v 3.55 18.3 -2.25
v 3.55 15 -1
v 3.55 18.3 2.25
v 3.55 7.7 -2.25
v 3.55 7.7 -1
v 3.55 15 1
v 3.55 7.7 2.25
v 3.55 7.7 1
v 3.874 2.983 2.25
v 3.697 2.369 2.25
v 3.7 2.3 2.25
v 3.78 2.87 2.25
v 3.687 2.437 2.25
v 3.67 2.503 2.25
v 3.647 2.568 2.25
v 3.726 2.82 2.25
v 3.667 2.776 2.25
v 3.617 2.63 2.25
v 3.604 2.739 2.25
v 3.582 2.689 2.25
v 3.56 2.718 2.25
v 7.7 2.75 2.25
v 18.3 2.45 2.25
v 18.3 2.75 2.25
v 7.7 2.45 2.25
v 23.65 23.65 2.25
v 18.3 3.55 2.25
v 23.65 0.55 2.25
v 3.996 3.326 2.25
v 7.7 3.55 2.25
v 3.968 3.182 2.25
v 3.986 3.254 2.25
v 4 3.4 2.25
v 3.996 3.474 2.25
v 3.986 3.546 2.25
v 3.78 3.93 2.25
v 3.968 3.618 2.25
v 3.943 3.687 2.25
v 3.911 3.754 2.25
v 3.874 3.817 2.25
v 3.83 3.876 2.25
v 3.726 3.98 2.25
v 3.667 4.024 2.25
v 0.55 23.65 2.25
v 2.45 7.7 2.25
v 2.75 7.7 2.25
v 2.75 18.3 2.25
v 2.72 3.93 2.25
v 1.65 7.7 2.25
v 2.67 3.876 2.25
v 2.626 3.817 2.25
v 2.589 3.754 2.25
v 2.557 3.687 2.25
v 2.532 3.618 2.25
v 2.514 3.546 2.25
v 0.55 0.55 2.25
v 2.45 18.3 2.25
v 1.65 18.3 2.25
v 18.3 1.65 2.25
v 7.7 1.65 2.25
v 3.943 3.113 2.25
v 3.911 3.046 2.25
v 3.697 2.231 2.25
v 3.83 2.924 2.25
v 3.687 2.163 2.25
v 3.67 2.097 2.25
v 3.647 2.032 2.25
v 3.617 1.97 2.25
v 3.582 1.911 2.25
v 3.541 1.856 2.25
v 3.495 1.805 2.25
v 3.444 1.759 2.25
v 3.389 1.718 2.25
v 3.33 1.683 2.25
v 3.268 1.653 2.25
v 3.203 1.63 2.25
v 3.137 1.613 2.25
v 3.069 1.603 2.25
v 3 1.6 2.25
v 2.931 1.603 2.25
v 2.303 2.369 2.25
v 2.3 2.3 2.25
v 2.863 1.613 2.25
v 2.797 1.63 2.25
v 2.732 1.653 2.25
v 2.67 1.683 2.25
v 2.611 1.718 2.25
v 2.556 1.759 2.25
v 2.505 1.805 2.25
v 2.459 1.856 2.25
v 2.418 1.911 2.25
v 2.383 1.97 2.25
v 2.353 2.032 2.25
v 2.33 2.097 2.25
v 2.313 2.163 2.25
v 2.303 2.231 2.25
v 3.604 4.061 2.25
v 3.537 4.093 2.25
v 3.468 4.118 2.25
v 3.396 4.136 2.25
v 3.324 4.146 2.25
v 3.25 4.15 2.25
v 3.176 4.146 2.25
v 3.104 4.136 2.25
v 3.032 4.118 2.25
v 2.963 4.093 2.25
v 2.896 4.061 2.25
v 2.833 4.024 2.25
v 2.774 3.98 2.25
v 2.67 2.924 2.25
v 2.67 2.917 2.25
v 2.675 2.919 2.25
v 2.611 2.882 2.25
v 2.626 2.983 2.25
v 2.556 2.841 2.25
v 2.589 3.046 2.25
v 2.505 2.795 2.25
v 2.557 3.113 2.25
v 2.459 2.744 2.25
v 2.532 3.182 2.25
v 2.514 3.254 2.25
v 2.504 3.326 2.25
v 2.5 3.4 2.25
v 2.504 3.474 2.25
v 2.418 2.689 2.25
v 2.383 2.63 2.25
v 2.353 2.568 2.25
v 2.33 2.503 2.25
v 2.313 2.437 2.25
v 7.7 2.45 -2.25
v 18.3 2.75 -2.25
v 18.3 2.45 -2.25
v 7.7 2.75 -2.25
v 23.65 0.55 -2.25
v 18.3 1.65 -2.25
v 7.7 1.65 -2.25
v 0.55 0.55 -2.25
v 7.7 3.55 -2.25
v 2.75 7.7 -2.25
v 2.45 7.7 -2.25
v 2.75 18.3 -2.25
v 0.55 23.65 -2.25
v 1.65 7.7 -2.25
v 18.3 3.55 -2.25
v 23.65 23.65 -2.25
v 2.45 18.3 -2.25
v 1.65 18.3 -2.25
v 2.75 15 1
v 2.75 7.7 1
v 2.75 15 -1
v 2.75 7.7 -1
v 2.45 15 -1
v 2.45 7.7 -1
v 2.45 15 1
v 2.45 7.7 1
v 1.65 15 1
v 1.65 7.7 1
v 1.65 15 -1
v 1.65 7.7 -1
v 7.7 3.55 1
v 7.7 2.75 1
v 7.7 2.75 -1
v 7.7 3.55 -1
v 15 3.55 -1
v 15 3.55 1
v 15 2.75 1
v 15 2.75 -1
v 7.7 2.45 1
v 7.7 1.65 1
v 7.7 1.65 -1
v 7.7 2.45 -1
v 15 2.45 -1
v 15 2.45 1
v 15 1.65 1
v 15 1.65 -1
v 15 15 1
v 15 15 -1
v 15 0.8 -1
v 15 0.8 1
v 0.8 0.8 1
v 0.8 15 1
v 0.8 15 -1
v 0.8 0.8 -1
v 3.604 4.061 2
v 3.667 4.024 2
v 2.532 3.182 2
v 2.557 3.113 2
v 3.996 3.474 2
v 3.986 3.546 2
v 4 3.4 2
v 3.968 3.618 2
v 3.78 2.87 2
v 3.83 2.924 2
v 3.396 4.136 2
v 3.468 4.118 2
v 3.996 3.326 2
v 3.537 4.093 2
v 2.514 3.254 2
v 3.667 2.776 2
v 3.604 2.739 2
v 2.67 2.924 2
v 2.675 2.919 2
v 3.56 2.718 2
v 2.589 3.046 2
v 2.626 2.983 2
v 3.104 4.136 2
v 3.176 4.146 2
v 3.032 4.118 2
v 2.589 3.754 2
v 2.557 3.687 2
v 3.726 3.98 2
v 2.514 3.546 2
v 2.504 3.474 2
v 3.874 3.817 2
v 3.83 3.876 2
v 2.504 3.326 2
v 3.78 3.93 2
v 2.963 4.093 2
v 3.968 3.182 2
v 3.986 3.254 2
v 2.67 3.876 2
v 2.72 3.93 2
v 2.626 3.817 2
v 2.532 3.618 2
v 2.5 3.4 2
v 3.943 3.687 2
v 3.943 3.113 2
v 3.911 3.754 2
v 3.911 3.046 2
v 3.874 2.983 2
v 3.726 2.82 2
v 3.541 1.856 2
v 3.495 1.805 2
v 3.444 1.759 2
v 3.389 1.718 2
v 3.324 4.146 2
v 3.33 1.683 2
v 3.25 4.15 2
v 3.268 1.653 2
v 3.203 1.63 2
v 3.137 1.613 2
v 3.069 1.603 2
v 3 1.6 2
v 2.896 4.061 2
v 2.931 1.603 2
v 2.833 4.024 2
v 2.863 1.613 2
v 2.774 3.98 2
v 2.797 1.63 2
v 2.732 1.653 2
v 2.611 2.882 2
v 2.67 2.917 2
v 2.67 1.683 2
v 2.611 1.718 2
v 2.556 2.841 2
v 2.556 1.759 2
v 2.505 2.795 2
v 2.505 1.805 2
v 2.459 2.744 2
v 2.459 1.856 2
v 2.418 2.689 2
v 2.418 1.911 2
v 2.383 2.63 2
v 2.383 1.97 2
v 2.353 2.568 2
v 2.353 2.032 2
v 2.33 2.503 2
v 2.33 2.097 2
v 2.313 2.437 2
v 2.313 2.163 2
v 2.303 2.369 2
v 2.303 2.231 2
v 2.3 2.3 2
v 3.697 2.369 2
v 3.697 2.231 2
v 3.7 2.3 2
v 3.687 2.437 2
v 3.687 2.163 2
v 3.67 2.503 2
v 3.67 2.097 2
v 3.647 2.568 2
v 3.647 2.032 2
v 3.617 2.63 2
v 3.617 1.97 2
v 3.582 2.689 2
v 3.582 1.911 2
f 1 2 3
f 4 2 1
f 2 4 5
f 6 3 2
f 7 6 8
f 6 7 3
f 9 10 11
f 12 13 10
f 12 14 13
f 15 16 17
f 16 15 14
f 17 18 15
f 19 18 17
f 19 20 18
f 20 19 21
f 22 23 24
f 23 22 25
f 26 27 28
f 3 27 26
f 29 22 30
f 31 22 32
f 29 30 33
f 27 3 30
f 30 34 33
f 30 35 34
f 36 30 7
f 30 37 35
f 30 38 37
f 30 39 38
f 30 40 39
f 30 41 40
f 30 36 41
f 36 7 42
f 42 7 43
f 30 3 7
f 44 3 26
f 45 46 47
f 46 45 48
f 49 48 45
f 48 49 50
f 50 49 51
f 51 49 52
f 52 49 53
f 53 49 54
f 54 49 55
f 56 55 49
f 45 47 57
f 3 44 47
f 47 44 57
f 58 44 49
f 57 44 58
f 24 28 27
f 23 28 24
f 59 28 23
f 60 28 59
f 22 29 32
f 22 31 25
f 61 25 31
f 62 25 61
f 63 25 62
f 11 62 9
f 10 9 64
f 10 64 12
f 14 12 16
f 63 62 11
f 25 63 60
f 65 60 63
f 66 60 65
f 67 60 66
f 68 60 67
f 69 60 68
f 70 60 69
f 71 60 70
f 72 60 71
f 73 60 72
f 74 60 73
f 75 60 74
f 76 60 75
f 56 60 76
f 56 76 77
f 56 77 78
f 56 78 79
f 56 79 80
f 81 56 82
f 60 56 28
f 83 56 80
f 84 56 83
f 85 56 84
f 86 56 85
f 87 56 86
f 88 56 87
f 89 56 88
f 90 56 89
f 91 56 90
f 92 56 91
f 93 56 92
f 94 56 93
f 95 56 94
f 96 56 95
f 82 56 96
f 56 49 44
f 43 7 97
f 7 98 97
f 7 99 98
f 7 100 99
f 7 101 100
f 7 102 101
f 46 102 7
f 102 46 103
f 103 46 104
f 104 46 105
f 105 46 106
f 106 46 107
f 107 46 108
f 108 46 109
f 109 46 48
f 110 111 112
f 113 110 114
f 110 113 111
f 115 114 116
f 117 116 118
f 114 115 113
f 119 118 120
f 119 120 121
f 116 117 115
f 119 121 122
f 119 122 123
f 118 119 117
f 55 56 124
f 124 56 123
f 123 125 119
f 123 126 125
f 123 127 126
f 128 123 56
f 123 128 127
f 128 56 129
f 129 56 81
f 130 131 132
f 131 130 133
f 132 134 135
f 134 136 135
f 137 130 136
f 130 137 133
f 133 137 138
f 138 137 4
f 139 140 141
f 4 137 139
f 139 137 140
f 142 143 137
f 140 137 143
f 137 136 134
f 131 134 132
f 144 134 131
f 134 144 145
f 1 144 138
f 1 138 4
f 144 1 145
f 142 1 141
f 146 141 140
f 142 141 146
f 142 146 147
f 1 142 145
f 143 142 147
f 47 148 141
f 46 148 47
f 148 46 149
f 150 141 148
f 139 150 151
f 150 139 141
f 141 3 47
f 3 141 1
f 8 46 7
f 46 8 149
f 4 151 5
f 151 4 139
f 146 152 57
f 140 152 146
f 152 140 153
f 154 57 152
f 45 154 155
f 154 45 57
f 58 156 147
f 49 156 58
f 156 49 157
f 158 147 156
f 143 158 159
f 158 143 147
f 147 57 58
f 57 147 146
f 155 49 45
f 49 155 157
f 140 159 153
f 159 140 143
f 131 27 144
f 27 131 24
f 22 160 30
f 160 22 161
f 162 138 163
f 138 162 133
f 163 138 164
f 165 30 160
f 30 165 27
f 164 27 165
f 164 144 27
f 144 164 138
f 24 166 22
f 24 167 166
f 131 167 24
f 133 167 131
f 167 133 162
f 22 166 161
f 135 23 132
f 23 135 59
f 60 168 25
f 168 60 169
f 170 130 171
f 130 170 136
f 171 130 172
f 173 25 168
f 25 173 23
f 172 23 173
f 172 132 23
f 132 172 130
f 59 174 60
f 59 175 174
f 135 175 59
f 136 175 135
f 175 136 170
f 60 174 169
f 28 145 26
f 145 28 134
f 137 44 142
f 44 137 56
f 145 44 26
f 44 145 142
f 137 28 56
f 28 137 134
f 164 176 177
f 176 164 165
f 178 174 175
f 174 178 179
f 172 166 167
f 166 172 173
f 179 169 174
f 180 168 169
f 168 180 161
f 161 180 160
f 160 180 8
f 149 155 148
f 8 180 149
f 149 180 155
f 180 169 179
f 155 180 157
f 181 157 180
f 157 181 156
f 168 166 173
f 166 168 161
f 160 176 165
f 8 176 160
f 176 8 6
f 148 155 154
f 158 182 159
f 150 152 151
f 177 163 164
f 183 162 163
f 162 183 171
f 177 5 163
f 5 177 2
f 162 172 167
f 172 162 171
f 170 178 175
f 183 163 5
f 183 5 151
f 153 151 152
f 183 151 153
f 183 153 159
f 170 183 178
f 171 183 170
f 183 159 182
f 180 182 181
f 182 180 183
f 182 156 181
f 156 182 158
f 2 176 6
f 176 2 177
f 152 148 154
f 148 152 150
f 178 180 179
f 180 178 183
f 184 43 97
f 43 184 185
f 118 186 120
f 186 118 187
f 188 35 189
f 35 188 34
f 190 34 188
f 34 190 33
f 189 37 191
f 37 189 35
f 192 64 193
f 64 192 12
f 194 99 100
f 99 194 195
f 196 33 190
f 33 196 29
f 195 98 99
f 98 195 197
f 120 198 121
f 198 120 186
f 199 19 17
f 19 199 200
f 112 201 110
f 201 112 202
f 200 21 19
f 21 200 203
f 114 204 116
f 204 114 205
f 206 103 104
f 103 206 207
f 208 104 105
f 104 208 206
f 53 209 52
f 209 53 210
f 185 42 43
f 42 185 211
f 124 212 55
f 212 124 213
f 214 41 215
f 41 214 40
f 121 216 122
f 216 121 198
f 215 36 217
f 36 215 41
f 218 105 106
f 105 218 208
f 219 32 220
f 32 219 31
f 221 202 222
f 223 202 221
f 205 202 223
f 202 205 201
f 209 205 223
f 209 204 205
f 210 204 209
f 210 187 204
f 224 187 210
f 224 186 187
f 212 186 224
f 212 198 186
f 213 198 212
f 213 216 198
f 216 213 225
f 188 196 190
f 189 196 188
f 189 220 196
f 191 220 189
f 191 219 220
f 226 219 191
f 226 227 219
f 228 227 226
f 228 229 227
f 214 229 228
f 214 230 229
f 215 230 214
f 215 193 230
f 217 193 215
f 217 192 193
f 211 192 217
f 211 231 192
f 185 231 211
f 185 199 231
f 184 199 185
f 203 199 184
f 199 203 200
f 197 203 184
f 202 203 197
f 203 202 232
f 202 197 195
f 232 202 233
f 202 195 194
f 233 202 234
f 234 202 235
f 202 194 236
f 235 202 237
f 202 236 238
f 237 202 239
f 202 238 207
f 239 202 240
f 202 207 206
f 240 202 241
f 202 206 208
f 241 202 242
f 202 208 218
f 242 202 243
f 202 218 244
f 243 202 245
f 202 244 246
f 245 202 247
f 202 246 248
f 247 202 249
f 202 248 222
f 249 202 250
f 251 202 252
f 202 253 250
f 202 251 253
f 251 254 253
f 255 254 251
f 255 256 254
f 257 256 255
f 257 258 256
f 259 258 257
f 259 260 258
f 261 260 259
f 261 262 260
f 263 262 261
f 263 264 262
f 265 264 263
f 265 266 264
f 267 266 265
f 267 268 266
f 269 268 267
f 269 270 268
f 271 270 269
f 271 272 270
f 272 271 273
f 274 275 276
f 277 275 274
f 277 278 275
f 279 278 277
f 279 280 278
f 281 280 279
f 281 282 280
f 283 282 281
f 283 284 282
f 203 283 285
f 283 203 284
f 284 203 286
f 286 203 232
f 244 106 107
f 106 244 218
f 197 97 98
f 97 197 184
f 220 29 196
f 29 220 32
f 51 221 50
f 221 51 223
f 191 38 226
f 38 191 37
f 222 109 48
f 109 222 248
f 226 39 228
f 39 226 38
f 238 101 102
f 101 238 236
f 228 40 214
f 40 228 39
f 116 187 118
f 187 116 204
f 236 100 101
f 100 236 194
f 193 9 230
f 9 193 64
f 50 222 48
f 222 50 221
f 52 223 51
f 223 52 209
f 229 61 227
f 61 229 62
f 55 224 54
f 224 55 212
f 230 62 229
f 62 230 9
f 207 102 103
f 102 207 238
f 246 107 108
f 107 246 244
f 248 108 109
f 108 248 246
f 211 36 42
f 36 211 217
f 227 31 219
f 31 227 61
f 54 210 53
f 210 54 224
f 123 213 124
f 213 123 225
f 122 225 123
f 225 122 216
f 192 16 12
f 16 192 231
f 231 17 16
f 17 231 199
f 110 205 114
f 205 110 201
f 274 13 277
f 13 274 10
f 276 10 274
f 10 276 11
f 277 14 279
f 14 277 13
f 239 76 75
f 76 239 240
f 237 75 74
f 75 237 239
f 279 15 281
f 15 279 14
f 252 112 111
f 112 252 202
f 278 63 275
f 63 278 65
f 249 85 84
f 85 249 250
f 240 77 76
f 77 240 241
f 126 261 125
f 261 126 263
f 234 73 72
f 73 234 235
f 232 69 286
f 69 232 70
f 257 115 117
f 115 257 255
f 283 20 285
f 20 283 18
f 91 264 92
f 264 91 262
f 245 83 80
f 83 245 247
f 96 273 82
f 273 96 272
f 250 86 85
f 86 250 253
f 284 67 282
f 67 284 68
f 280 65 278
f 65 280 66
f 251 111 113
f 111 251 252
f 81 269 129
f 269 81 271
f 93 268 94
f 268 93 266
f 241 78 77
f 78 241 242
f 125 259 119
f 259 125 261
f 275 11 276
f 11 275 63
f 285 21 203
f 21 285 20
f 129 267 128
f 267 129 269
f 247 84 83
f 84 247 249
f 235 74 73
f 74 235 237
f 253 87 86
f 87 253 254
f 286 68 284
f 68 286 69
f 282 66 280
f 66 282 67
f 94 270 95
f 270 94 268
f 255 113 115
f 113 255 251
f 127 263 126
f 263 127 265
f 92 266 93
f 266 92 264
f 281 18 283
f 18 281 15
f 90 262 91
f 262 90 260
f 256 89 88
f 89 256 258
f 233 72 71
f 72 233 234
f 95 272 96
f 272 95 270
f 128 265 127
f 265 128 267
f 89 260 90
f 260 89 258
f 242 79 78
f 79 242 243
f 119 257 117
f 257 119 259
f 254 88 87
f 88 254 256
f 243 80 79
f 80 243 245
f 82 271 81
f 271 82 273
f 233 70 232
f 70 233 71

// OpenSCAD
// ============================================================================
// PG1350 to PG1425 Switch Adapter - Main Shell Design (FIXED)
// OpenSCAD model for 3D printing
// 
// DESIGN: Plate-mounted bezel with dual-ended stamped contacts (Option B)
// See CONSOLIDATED_SWITCH_SPECS.md and project_overview.md for design details
//
// AUTHOR: Fixed geometry to properly connect all parts
// ============================================================================

// ============================================================================
// TOP-LEVEL CONFIGURABLE PARAMETERS
// ============================================================================

// Material & Print Settings
$fn = 64;                           // Smoothness of curves (higher = smoother, slower render)
wall_thickness = 1.2;               // mm - Wall thickness for printed shell
base_thickness = 2.0;               // mm - Base plate thickness
top_cover_thickness = 2.5;          // mm - Top cover thickness
filament_width = 0.6;               // mm - Typical FDM filament width

// Assembly & Tolerance Settings
print_tolerance = 0.1;              // mm - Add to internal dimensions for printing
assembly_clearance = 0.2;           // mm - Clearance for moving parts/assembly
contact_material_thickness = 0.5;   // mm - Thickness of stamped contact material
mounting_clearance = 0.3;           // mm - Extra clearance for mounting holes

// ============================================================================
// PG1350 SWITCH DIMENSIONS (from Kaihua Electronics CP6135001D02-1)
// ============================================================================

// External dimensions (top shell)
choc_external_width = 15.0;         // mm - Top shell width/height
choc_external_height = 15.0;        // mm - Bottom shell width/height

// Internal opening (where switch stem enters)
choc_internal_opening = 13.8;       // mm - Critical dimension for PG1350 compatibility

// Stem diameter (critical for mechanical stability)
choc_stem_diameter = 3.2;           // mm - Must match PG1350 stem exactly

// Mounting heights
choc_top_mount_height = 5.0;        // mm - Top mounting height from PCB
choc_bottom_mount_height = 5.8;     // mm - Bottom mounting height from PCB

// PCB interface (PG1350 side)
choc_pcb_width = 5.90;              // mm - Overall PCB width
choc_pcb_length = 11.00;            // mm - Overall PCB length  
choc_pin_spacing_x = 3.80;          // mm - Pin center-to-center (X)
choc_pin_spacing_y = 5.00;          // mm - Pin center-to-center (Y)

// PCB mounting holes
choc_top_hole_diameter = 1.90;      // mm - Top mounting holes (2 holes)
choc_bottom_hole_diameter = 1.20;   // mm - Bottom mounting holes (2 holes)

// Side profile features
choc_side_height = 14.50;           // mm - Total side height
choc_top_flange_width = 2.65;       // mm - Top flange width
choc_bottom_flange_width = 3.00;    // mm - Bottom flange width

// ============================================================================
// PG1425 SWITCH DIMENSIONS (from Kaihua Electronics CP6142501D02)
// ============================================================================

// External dimensions
pg1425_external_width = 14.0;       // mm - Top shell width/height
pg1425_external_height = 14.0;      // mm - Bottom shell width/height

// Internal opening (where switch stem enters)
pg1425_internal_opening = 10.2;     // mm - Critical dimension for PG1425 compatibility

// Stem diameter (critical for mechanical stability)
pg1425_stem_diameter = 0.9;         // mm - Must match PG1425 stem exactly

// Mounting heights
pg1425_top_mount_height = 5.0;      // mm - Top mounting height from PCB
pg1425_bottom_mount_height = 5.0;   // mm - Bottom mounting height from PCB

// PCB interface (PG1425 side)
pg1425_pcb_width = 5.50;            // mm - Overall PCB width
pg1425_pcb_length = 5.50;           // mm - Overall PCB length
pg1425_pin_spacing = 2.90;          // mm - Pin center-to-center

// PCB mounting holes
pg1425_top_hole_diameter = 1.30;    // mm - Top mounting holes (2 holes)
pg1425_bottom_hole_diameter = 1.10; // mm - Bottom mounting holes (2 holes)

// Land pattern (copper clad side)
pg1425_top_land_width = 5.10;       // mm - Top land width
pg1425_bottom_land_width = 5.50;    // mm - Bottom land width

// LED position (full color variant)
pg1425_led_x_offset = 4.10;         // mm from left pin center
pg1425_led_y_offset = 1.15;         // mm from bottom pin center

// ============================================================================
// ADAPTER GEOMETRY CALCULATIONS
// ============================================================================

// Size difference between PG1350 and PG1425 external dimensions
size_diff_width = choc_external_width - pg1425_external_width;  // 1.0mm
size_diff_height = choc_external_height - pg1425_external_height; // 1.0mm

// Gap to bridge (PG1350 internal opening minus PG1425 PCB footprint)
gap_to_bridge_x = choc_internal_opening - pg1425_pcb_width;    // 8.3mm total
gap_to_bridge_y = choc_internal_opening - pg1425_pcb_length;   // 8.3mm total

// Per-side gap for bridge design (centered)
bridge_half_x = gap_to_bridge_x / 2;     // ~4.15mm per side
bridge_half_y = gap_to_bridge_y / 2;     // ~4.15mm per side

// PCB interface gap
pcb_gap_width = choc_pcb_width - pg1425_pcb_width;    // 0.40mm total (0.20mm per side)

// ============================================================================
// HELPER FUNCTIONS
// ============================================================================

// Module to create a cylindrical hole with optional counterbore
module mounting_hole(x, y, diameter, depth, counterbore_diameter = null, 
                      counterbore_depth = null) {
    // Main through-hole
    cylinder(h = depth + 0.2, r = diameter/2, center = [x, y], $fn = 32);
    
    // Optional counterbore
    if (counterbore_diameter != null) {
        translate([x, y, -counterbore_depth]) 
            cylinder(h = depth + counterbore_depth + 0.2, r = counterbore_diameter/2, center = [x, y], $fn = 32);
    }
}

// Module to create a cylindrical protrusion/post
module post(x, y, diameter, height) {
    cylinder(h = height, r = diameter/2, center = [x, y], $fn = 32);
}

// ============================================================================
// MAIN RENDER BLOCK - Constructive Solid Geometry Approach (FIXED)
// ============================================================================

difference() {
    // Start with a solid outer bounding box (the complete adapter shell)
    translate([wall_thickness/2 - print_tolerance/2, wall_thickness/2 - print_tolerance/2, 
                -(base_thickness + top_cover_thickness)/2])
        cube([choc_external_width + pg1425_pcb_width + 2*wall_thickness - (print_tolerance-assembly_clearance)*2, 
               choc_external_height + pg1425_pcb_length + 2*wall_thickness - (print_tolerance-assembly_clearance)*2, 
               base_thickness + top_cover_thickness], center = [0, 0, 0]);
    
    // Carve out PG1350 side cavity with proper wall thickness
    translate([wall_thickness/2 + assembly_clearance, wall_thickness/2 + assembly_clearance, -base_thickness/2])
        cube([choc_internal_opening + assembly_clearance*2, 
               choc_internal_opening + assembly_clearance*2, base_thickness], center = [choc_external_width/2, choc_external_height/2, 0]);
    
    // Carve out PG1425 side cavity with proper wall thickness - FIXED POSITIONING
    translate([wall_thickness/2 + assembly_clearance, wall_thickness/2 + assembly_clearance, -base_thickness/2])
        cube([pg1425_internal_opening + assembly_clearance*2, 
               pg1425_internal_opening + assembly_clearance*2, base_thickness], center = [choc_external_width/2 + bridge_half_x, choc_external_height/2 + bridge_half_y, 0]);
    
    // Carve out PG1350 PCB mounting holes (top) - subtract from solid
    translate([-choc_pcb_width/2 - choc_top_hole_diameter/2 - mounting_clearance + wall_thickness/2, 
                -choc_pin_spacing_y/2 - choc_top_hole_diameter/2 - mounting_clearance + wall_thickness/2, base_thickness])
        cylinder(h = base_thickness + 0.2, r = (choc_top_hole_diameter + mounting_clearance)/2);
    
    translate([choc_pcb_width/2 + choc_top_hole_diameter/2 + mounting_clearance - wall_thickness/2, 
                -choc_pin_spacing_y/2 - choc_top_hole_diameter/2 - mounting_clearance + wall_thickness/2, base_thickness])
        cylinder(h = base_thickness + 0.2, r = (choc_top_hole_diameter + mounting_clearance)/2);
    
    // Carve out PG1350 PCB mounting holes (bottom)  
    translate([-choc_pcb_width/2 - choc_bottom_hole_diameter/2 - mounting_clearance + wall_thickness/2, 
                choc_pin_spacing_y/2 + choc_bottom_hole_diameter/2 - mounting_clearance + wall_thickness/2, base_thickness])
        cylinder(h = base_thickness + 0.2, r = (choc_bottom_hole_diameter + mounting_clearance)/2);
    
    translate([choc_pcb_width/2 + choc_bottom_hole_diameter/2 + mounting_clearance - wall_thickness/2, 
                choc_pin_spacing_y/2 + choc_bottom_hole_diameter/2 - mounting_clearance + wall_thickness/2, base_thickness])
        cylinder(h = base_thickness + 0.2, r = (choc_bottom_hole_diameter + mounting_clearance)/2);
    
    // Carve out PG1425 PCB mounting holes (top)
    translate([-pg1425_pcb_width/2 - pg1425_top_hole_diameter/2 - mounting_clearance + wall_thickness/2, 
                -pg1425_pin_spacing/2 - pg1425_top_hole_diameter/2 - mounting_clearance + wall_thickness/2, base_thickness])
        cylinder(h = base_thickness + 0.2, r = (pg1425_top_hole_diameter + mounting_clearance)/2);
    
    translate([pg1425_pcb_width/2 + pg1425_top_hole_diameter/2 + mounting_clearance - wall_thickness/2, 
                -pg1425_pin_spacing/2 - pg1425_top_hole_diameter/2 - mounting_clearance + wall_thickness/2, base_thickness])
        cylinder(h = base_thickness + 0.2, r = (pg1425_top_hole_diameter + mounting_clearance)/2);
    
    // Carve out PG1425 PCB mounting holes (bottom)  
    translate([-pg1425_pcb_width/2 - pg1425_bottom_hole_diameter/2 - mounting_clearance + wall_thickness/2, 
                pg1425_pin_spacing/2 + pg1425_bottom_hole_diameter/2 - mounting_clearance + wall_thickness/2, base_thickness])
        cylinder(h = base_thickness + 0.2, r = (pg1425_bottom_hole_diameter + mounting_clearance)/2);
    
    translate([pg1425_pcb_width/2 + pg1425_bottom_hole_diameter/2 + mounting_clearance - wall_thickness/2, 
                pg1425_pin_spacing/2 + pg1425_bottom_hole_diameter/2 - mounting_clearance + wall_thickness/2, base_thickness])
        cylinder(h = base_thickness + 0.2, r = (pg1425_bottom_hole_diameter + mounting_clearance)/2);
    
    // ADD BRIDGE WALLS BETWEEN PG1350 AND PG1425 SIDES - THIS CONNECTS THE GEOMETRY
    union() {
        // Left bridge wall (connecting the two cavities)
        translate([choc_external_width/2 - bridge_half_x - wall_thickness/2, 
                    choc_external_height/2 + assembly_clearance, 
                    -(base_thickness + top_cover_thickness)/2])
            cube([wall_thickness - assembly_clearance*2, 
                   pg1425_internal_opening + assembly_clearance*2, 
                   base_thickness + top_cover_thickness], center = [0, 0, 0]);
        
        // Right bridge wall (connecting the two cavities)
        translate([choc_external_width/2 + bridge_half_x + wall_thickness/2 - pg1425_internal_opening - assembly_clearance*2, 
                    choc_external_height/2 + assembly_clearance, 
                    -(base_thickness + top_cover_thickness)/2])
            cube([wall_thickness - assembly_clearance*2, 
                   pg1425_internal_opening + assembly_clearance*2, 
                   base_thickness + top_cover_thickness], center = [0, 0, 0]);
        
        // Front bridge wall (connecting the two cavities)
        translate([choc_external_width/2 + assembly_clearance, 
                    choc_external_height/2 - bridge_half_y - wall_thickness/2, 
                    -(base_thickness + top_cover_thickness)/2])
            cube([pg1425_internal_opening + assembly_clearance*2, 
                   wall_thickness - assembly_clearance*2, 
                   base_thickness + top_cover_thickness], center = [0, 0, 0]);
        
        // Rear bridge wall (connecting the two cavities)
        translate([choc_external_width/2 + assembly_clearance, 
                    choc_external_height/2 + bridge_half_y + wall_thickness/2 - pg1425_internal_opening - assembly_clearance*2, 
                    -(base_thickness + top_cover_thickness)/2])
            cube([pg1425_internal_opening + assembly_clearance*2, 
                   wall_thickness - assembly_clearance*2, 
                   base_thickness + top_cover_thickness], center = [0, 0, 0]);
    }
}

// ============================================================================
// END OF FILE
// ============================================================================
